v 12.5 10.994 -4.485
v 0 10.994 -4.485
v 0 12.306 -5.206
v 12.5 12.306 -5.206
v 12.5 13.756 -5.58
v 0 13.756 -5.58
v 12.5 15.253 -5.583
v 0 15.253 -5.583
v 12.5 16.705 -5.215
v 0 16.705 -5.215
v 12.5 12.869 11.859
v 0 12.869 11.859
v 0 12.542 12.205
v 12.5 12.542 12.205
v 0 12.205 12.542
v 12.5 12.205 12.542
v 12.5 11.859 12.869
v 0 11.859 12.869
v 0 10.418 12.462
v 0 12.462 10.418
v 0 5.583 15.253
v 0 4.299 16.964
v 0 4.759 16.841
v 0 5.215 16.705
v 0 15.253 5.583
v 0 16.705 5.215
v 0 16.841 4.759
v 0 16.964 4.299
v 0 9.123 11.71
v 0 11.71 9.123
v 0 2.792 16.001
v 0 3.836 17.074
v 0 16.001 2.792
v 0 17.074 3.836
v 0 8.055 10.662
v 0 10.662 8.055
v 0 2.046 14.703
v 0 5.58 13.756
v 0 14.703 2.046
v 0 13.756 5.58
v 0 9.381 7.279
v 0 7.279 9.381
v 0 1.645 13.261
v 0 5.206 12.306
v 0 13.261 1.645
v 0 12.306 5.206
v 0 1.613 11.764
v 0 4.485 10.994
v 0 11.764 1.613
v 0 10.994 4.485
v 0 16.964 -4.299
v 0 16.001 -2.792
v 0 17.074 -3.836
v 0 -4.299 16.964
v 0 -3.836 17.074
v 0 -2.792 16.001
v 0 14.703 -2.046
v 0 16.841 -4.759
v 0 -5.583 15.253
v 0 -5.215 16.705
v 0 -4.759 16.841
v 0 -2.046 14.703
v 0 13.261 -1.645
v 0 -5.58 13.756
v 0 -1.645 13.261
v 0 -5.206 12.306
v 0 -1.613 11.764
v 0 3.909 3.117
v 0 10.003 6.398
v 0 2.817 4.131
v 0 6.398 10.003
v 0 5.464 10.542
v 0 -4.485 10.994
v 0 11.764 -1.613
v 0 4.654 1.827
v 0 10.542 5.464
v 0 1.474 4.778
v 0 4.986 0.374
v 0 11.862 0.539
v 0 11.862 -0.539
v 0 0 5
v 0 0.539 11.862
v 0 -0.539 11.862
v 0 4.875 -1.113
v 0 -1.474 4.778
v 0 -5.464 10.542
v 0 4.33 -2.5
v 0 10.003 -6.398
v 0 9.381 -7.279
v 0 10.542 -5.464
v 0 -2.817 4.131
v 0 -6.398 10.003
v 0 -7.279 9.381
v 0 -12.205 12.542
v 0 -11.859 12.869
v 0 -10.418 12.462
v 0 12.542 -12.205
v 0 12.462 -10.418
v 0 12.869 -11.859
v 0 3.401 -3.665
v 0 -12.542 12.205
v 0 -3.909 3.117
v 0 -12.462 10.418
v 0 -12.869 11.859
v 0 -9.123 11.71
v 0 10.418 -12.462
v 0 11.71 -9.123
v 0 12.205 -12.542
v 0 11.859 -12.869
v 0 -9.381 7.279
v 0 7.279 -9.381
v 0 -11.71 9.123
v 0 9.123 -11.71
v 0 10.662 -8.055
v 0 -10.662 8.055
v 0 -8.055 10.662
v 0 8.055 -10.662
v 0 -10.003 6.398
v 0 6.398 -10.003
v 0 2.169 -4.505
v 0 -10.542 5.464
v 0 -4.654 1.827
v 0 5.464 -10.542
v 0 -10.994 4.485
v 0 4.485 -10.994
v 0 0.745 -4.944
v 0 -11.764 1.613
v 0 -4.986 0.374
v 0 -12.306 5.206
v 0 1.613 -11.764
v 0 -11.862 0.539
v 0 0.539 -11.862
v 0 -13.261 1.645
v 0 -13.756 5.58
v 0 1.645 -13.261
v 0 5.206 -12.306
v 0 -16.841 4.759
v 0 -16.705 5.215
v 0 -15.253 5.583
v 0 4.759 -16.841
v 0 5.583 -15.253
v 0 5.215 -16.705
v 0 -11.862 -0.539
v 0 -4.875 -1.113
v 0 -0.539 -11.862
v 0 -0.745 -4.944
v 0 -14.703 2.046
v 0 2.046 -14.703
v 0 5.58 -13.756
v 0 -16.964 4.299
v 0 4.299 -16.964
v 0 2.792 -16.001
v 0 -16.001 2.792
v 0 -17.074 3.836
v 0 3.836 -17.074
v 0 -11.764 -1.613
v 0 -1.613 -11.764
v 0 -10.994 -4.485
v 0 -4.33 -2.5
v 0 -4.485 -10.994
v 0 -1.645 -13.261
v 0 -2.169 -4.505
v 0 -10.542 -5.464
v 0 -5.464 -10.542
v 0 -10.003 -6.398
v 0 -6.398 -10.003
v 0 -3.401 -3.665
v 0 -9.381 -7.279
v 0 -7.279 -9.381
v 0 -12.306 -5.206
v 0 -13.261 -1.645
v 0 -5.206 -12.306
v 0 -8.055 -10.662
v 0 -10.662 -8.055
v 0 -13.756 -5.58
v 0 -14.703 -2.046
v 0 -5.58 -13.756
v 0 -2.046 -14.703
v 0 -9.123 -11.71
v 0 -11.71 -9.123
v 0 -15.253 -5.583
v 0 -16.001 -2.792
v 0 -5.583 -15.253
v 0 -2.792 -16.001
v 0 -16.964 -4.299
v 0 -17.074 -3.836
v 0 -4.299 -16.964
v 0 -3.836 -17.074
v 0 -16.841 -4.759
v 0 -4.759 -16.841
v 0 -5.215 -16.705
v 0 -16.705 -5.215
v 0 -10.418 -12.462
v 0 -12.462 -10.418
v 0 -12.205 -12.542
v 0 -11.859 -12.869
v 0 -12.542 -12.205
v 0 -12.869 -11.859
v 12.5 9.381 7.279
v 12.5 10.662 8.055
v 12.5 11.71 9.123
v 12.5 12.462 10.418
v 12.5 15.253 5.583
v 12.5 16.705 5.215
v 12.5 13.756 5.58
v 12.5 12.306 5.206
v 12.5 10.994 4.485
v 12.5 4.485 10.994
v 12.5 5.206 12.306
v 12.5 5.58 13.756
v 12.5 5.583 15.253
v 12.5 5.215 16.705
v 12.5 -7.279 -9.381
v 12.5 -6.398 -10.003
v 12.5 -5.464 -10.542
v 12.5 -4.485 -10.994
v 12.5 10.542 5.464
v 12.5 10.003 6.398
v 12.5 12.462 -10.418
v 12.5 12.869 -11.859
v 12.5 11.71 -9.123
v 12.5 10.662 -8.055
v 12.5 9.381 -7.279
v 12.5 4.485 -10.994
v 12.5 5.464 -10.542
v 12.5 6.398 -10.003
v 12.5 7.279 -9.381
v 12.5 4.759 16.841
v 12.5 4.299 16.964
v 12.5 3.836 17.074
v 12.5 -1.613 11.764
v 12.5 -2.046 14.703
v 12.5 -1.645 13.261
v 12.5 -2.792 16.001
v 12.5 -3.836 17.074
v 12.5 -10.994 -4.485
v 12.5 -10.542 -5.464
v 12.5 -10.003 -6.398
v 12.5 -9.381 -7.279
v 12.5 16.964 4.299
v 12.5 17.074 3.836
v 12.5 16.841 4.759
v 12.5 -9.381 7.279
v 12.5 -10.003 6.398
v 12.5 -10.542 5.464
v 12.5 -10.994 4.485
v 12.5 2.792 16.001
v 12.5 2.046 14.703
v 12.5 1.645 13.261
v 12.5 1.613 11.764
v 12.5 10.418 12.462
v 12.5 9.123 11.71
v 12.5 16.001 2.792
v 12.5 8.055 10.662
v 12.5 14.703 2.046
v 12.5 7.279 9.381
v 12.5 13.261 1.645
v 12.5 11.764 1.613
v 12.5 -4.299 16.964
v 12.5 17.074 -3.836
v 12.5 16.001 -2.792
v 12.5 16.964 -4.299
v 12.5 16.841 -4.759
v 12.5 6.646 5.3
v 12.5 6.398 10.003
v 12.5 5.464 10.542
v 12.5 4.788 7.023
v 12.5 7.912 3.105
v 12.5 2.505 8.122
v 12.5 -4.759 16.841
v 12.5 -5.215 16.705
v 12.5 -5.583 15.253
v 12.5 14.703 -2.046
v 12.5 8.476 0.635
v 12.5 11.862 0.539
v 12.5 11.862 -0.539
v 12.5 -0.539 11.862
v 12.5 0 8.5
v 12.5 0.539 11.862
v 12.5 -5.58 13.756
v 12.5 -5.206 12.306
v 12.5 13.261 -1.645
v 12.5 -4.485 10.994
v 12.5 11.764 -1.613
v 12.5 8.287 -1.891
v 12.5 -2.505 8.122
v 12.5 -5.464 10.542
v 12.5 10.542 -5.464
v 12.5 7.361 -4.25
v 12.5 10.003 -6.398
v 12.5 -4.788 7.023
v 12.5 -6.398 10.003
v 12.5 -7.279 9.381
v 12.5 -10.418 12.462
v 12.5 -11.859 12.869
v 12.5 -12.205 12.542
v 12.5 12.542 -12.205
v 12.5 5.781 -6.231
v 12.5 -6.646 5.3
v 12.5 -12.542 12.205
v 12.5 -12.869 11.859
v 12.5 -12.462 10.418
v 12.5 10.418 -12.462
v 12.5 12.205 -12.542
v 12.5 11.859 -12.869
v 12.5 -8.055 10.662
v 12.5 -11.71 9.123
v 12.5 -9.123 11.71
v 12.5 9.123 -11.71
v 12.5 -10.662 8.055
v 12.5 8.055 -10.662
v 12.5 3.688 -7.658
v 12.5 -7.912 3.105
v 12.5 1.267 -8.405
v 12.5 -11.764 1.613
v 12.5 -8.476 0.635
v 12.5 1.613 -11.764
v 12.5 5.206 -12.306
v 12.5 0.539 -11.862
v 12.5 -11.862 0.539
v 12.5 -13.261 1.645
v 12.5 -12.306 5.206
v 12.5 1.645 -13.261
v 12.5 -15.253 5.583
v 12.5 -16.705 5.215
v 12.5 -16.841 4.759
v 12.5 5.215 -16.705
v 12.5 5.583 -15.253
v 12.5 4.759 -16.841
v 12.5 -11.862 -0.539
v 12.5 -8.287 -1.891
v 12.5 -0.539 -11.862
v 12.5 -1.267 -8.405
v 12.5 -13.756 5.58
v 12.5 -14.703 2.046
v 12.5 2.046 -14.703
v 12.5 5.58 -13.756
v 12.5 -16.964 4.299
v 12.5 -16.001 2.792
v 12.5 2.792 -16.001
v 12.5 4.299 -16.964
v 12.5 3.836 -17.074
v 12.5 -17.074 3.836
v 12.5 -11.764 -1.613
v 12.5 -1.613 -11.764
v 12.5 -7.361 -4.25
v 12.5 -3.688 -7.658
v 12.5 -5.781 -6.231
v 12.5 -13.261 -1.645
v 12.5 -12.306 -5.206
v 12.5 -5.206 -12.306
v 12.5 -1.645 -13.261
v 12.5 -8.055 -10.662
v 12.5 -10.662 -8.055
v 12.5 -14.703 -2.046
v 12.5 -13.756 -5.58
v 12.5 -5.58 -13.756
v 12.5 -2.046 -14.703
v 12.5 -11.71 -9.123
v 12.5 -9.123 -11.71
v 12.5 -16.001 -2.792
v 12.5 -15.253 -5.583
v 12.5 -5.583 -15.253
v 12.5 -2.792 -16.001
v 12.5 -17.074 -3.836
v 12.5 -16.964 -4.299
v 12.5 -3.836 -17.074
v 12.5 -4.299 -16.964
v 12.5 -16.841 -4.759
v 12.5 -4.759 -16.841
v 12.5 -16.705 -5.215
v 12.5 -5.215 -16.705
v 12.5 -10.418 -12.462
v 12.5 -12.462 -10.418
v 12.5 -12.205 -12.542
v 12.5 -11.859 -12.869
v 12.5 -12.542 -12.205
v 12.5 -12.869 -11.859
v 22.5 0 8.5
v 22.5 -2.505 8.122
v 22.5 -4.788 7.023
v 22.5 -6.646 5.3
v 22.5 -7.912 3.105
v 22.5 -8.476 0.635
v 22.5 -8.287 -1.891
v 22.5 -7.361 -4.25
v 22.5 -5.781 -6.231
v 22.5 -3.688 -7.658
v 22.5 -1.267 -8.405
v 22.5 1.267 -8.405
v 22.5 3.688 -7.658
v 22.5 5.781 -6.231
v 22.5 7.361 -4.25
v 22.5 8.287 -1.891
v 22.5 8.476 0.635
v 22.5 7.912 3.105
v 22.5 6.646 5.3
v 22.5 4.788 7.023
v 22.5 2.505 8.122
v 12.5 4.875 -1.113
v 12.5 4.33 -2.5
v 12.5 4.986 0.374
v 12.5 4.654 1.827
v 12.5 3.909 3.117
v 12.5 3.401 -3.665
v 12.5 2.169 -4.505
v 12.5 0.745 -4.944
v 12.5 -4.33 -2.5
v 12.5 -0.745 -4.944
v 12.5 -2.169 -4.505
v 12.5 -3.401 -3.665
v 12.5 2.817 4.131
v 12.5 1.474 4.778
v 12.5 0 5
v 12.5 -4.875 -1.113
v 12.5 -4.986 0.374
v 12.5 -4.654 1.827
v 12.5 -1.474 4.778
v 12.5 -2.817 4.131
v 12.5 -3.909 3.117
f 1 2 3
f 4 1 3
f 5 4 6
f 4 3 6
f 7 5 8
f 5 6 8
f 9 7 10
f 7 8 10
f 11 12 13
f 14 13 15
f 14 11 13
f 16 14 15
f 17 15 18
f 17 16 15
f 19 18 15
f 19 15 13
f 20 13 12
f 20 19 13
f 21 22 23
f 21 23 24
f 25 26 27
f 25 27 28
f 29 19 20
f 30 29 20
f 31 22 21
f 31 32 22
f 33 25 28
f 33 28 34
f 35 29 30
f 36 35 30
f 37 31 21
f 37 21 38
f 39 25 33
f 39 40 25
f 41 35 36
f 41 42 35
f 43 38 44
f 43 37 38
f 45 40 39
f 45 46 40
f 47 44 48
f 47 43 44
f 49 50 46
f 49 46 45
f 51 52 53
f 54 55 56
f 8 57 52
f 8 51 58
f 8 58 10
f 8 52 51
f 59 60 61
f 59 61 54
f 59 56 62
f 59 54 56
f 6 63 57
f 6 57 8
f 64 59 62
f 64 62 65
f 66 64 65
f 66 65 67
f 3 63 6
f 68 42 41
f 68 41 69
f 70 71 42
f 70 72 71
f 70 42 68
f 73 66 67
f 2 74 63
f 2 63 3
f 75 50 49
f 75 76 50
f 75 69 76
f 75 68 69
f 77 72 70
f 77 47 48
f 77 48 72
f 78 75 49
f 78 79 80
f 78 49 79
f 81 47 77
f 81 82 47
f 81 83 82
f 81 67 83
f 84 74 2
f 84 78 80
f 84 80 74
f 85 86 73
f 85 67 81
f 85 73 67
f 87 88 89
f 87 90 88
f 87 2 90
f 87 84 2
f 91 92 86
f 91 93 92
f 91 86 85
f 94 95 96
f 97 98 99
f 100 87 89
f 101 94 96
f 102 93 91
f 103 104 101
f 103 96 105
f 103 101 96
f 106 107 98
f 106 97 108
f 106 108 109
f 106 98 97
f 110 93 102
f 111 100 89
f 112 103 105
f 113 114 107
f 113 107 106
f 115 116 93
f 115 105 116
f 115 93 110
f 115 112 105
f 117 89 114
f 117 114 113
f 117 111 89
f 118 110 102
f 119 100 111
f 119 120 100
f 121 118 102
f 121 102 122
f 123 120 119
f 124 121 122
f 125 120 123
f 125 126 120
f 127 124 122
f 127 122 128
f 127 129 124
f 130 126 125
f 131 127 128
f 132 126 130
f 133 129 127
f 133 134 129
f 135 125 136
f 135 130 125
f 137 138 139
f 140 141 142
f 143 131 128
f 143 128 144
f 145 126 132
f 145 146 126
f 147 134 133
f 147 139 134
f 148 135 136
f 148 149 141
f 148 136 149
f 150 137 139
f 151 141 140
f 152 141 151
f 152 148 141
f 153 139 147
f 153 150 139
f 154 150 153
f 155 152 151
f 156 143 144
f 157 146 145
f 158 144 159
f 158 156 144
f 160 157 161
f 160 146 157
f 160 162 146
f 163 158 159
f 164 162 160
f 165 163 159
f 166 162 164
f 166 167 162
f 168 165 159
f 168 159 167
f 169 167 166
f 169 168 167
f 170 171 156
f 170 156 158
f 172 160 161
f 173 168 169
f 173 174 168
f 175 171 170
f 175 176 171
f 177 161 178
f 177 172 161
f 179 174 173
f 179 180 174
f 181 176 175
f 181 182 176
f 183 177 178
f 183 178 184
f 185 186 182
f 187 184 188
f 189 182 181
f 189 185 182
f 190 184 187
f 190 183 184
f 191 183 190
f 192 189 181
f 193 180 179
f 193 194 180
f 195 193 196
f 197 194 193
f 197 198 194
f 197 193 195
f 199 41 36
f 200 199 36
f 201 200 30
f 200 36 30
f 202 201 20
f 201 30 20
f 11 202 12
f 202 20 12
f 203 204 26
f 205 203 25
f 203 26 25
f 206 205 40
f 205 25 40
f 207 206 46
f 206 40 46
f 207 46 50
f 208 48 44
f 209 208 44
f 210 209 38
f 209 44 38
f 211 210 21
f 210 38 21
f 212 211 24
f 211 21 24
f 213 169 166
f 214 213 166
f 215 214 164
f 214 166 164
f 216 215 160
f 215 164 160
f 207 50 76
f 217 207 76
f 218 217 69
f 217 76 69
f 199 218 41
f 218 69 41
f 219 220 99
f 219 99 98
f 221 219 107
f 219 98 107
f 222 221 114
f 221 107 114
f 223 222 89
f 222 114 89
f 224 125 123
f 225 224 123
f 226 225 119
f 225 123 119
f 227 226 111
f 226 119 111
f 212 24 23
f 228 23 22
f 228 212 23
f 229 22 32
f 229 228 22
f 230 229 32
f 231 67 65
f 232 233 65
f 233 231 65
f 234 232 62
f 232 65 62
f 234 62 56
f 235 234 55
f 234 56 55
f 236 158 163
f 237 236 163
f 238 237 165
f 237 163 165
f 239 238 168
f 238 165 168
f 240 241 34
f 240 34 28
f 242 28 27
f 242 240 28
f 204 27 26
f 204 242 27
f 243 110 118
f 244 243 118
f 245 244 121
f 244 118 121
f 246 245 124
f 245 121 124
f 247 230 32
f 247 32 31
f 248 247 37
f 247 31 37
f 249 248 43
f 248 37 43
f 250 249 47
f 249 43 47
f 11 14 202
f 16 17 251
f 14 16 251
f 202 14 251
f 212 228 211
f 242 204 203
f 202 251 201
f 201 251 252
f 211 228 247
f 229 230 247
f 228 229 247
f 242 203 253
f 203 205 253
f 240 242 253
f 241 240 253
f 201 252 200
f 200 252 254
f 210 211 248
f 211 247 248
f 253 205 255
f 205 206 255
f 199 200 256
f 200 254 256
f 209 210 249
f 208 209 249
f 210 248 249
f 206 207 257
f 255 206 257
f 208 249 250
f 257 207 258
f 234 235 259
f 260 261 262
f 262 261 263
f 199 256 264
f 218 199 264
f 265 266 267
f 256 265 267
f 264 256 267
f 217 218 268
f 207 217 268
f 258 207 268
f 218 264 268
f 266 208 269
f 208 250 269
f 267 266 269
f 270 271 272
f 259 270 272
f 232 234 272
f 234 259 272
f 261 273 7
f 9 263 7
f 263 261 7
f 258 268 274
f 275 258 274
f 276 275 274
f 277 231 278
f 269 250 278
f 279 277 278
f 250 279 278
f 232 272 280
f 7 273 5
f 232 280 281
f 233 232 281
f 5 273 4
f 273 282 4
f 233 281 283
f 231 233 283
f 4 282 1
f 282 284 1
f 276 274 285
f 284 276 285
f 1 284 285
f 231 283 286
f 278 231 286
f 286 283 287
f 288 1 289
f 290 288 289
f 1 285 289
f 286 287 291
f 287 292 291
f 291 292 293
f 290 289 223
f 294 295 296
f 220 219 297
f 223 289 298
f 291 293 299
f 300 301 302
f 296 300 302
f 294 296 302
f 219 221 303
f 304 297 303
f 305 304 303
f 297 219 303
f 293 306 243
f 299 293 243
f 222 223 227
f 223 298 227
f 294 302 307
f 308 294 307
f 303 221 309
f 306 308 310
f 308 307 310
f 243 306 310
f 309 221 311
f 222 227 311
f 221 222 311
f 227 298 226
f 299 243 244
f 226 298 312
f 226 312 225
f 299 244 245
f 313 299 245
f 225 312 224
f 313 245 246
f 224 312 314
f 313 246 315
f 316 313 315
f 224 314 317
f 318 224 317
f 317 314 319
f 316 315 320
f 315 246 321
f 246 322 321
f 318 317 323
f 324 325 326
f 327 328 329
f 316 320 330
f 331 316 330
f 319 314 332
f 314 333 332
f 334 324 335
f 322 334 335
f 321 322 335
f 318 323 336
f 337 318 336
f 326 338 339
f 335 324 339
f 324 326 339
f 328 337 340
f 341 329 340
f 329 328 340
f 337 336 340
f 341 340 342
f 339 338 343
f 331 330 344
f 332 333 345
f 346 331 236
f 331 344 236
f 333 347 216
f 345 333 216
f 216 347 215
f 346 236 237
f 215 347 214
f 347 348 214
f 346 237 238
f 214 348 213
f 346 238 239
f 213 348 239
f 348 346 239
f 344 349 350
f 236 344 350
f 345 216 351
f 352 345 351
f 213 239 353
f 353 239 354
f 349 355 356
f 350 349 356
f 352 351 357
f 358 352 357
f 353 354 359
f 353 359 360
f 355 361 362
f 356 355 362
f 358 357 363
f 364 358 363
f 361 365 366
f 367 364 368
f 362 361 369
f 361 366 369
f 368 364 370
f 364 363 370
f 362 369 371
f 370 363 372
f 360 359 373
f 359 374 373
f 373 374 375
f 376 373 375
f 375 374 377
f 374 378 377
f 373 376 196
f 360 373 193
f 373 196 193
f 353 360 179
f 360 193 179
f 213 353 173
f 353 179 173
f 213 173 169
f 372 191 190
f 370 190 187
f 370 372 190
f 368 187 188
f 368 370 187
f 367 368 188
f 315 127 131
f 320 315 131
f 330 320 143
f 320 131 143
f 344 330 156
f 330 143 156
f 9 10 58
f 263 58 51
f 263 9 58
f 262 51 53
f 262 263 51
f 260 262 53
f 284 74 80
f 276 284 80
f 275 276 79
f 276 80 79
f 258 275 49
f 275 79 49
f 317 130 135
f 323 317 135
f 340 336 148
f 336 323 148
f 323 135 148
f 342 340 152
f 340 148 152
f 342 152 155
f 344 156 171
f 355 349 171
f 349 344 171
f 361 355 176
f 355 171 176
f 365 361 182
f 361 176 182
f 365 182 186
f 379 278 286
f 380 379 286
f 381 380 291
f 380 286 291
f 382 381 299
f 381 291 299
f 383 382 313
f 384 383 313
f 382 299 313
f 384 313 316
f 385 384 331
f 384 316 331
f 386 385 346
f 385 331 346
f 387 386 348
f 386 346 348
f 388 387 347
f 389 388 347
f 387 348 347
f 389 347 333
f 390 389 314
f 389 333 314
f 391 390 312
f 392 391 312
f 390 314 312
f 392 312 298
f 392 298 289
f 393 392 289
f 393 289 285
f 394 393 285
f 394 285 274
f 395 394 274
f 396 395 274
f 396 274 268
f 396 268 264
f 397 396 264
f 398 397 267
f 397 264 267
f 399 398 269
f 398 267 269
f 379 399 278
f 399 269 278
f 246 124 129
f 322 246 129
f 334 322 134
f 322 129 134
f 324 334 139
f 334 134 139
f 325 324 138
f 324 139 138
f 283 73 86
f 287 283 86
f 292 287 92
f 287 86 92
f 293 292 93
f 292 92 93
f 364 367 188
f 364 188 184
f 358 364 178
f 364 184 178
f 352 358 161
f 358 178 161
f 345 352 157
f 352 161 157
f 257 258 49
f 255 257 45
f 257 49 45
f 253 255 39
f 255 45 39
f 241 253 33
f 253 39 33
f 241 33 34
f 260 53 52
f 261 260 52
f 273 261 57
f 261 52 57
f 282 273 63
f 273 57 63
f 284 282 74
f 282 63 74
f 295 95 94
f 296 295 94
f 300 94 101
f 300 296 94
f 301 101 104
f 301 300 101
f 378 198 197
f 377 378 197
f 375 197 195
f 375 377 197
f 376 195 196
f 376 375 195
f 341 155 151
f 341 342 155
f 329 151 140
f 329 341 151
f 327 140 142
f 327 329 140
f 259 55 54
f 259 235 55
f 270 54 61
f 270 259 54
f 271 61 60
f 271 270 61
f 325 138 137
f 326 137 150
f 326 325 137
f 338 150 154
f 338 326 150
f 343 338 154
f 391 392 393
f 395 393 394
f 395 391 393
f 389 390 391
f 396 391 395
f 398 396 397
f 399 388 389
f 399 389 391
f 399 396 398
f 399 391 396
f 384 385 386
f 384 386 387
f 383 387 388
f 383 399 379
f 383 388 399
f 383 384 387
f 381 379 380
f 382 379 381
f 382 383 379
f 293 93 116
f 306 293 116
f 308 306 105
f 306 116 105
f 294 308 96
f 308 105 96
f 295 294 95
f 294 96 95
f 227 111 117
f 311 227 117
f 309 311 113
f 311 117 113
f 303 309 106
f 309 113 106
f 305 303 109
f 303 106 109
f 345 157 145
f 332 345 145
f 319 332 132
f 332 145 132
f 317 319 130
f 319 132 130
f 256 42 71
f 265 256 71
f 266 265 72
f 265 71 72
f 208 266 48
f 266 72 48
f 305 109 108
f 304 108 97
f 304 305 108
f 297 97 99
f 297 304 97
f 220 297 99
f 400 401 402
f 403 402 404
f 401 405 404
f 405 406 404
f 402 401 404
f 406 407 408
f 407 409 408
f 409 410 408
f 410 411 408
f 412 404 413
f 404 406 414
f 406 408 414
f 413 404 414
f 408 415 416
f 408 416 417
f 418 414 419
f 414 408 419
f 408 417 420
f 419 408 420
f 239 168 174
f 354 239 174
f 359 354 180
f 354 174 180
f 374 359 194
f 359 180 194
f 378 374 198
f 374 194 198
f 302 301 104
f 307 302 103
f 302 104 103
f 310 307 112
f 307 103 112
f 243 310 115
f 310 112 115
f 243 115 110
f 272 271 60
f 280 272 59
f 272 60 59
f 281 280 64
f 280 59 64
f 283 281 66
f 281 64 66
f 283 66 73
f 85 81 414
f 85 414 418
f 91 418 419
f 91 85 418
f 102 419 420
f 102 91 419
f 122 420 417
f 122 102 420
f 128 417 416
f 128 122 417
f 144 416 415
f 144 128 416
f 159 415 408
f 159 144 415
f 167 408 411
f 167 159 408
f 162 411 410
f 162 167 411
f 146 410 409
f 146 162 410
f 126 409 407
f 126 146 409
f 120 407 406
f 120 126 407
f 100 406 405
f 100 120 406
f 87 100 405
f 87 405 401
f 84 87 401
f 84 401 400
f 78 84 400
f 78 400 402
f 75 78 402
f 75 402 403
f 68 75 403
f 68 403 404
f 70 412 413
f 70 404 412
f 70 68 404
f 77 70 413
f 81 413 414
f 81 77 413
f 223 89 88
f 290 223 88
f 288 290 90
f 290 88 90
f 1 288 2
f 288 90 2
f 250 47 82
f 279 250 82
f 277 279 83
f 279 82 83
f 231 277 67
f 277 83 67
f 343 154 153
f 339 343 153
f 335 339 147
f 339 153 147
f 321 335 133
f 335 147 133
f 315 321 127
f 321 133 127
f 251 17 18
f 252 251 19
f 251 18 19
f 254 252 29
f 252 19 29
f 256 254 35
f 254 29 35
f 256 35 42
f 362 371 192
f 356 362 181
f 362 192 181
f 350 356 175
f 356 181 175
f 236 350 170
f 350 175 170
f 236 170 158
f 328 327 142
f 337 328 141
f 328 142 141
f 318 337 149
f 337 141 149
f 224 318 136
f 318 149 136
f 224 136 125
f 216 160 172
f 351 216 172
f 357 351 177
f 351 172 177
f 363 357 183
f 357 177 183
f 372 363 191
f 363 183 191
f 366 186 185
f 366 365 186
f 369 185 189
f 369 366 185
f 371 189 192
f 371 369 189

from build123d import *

# Parameters (mm, degrees)
BASPROSKE_W                  = 12.5
BASPROSKE_H                  = 17.5
TOOTHCUT_DEPTH               = 28.726341266
TEETHCUTS_COUNT              = 12
TEETHCUTS_ANGLE              = 330
BORSKE_R                     = 0.75
BORE_DEPTH                   = 50.0000508
ENL_V_MAT_EXTRU_2_DEPTH      = 10
ENL_V_MAT_EXTRU_2_DEPTH_BACK = 60
ESQUISSE1_R                  = 5
ESQUISSE2_R                  = 8.5
BOSS_EXTRU_1_DEPTH           = 10


with BuildPart() as part:
    # BasProSke → Base-Revolve (revolve)
    with BuildSketch(Plane(origin=(0, 0, 0), x_dir=(1, 0, 0), z_dir=(0, 1, 0)), mode=Mode.PRIVATE) as base_revolve_sk:
        with Locations((6.25, 8.75)):
            Rectangle(BASPROSKE_W, BASPROSKE_H)
    revolve(base_revolve_sk.sketch.rotate(Axis((-10, 0, 0), (1, 0, 0)), 180), axis=Axis((-10, 0, 0), (1, 0, 0)))

    # TooCutSke → ToothCut (cut, through all)
    with BuildSketch(Plane(origin=(0, 0, 0), x_dir=(0, 0, -1), z_dir=(1, 0, 0))):
        with BuildLine():
            ThreePointArc((1.612970859, 11.763936459), (0, 11.874), (-1.612970859, 11.763936459))
            ThreePointArc((-1.612970859, 11.763936459), (-2.052105863, 14.718225349), (-3.861172246, 17.094765107))
            ThreePointArc((-3.861172246, 17.094765107), (0, 17.5254), (3.861172246, 17.094765107))
            ThreePointArc((3.861172246, 17.094765107), (2.052105863, 14.718225349), (1.612970859, 11.763936459))
        make_face()
    toothcut = extrude(amount=TOOTHCUT_DEPTH, mode=Mode.SUBTRACT)

    # TeethCuts: ToothCut ×12 about axis
    teethcuts_axis = Axis((-10, 0, 0), (1, 0, 0))
    for i in range(1, TEETHCUTS_COUNT):
        add(toothcut.rotate(teethcuts_axis, i * TEETHCUTS_ANGLE / (TEETHCUTS_COUNT - 1)), mode=Mode.SUBTRACT)

    # BorSke → Bore (cut, symmetric)
    with BuildSketch(Plane(origin=(0, 0, 0), x_dir=(0, 0, -1), z_dir=(1, 0, 0))):
        with Locations(Location((0, 0, 0), (0, 0, 180))):
            Circle(BORSKE_R)
    extrude(amount=BORE_DEPTH, both=True, mode=Mode.SUBTRACT)

    # Esquisse1 → Enlèv. mat.-Extru.2 (cut, two sides: drawn at the far end of the back side and taken through both)
    with BuildSketch(Plane(origin=(12.5, 0, 0), x_dir=(0, 0, -1), z_dir=(1, 0, 0)).offset(-ENL_V_MAT_EXTRU_2_DEPTH_BACK)):
        with Locations(Location((0, 0, 0), (0, 0, 180))):
            Circle(ESQUISSE1_R)
    extrude(amount=ENL_V_MAT_EXTRU_2_DEPTH + ENL_V_MAT_EXTRU_2_DEPTH_BACK, mode=Mode.SUBTRACT)

    # Esquisse2 → Boss.-Extru.1 (add)
    with BuildSketch(Plane(origin=(12.5, 0, 0), x_dir=(0, 0, -1), z_dir=(1, 0, 0))):
        with Locations(Location((0, 0, 0), (0, 0, 180))):
            Circle(ESQUISSE2_R)
    extrude(amount=BOSS_EXTRU_1_DEPTH)


solid = part.part
